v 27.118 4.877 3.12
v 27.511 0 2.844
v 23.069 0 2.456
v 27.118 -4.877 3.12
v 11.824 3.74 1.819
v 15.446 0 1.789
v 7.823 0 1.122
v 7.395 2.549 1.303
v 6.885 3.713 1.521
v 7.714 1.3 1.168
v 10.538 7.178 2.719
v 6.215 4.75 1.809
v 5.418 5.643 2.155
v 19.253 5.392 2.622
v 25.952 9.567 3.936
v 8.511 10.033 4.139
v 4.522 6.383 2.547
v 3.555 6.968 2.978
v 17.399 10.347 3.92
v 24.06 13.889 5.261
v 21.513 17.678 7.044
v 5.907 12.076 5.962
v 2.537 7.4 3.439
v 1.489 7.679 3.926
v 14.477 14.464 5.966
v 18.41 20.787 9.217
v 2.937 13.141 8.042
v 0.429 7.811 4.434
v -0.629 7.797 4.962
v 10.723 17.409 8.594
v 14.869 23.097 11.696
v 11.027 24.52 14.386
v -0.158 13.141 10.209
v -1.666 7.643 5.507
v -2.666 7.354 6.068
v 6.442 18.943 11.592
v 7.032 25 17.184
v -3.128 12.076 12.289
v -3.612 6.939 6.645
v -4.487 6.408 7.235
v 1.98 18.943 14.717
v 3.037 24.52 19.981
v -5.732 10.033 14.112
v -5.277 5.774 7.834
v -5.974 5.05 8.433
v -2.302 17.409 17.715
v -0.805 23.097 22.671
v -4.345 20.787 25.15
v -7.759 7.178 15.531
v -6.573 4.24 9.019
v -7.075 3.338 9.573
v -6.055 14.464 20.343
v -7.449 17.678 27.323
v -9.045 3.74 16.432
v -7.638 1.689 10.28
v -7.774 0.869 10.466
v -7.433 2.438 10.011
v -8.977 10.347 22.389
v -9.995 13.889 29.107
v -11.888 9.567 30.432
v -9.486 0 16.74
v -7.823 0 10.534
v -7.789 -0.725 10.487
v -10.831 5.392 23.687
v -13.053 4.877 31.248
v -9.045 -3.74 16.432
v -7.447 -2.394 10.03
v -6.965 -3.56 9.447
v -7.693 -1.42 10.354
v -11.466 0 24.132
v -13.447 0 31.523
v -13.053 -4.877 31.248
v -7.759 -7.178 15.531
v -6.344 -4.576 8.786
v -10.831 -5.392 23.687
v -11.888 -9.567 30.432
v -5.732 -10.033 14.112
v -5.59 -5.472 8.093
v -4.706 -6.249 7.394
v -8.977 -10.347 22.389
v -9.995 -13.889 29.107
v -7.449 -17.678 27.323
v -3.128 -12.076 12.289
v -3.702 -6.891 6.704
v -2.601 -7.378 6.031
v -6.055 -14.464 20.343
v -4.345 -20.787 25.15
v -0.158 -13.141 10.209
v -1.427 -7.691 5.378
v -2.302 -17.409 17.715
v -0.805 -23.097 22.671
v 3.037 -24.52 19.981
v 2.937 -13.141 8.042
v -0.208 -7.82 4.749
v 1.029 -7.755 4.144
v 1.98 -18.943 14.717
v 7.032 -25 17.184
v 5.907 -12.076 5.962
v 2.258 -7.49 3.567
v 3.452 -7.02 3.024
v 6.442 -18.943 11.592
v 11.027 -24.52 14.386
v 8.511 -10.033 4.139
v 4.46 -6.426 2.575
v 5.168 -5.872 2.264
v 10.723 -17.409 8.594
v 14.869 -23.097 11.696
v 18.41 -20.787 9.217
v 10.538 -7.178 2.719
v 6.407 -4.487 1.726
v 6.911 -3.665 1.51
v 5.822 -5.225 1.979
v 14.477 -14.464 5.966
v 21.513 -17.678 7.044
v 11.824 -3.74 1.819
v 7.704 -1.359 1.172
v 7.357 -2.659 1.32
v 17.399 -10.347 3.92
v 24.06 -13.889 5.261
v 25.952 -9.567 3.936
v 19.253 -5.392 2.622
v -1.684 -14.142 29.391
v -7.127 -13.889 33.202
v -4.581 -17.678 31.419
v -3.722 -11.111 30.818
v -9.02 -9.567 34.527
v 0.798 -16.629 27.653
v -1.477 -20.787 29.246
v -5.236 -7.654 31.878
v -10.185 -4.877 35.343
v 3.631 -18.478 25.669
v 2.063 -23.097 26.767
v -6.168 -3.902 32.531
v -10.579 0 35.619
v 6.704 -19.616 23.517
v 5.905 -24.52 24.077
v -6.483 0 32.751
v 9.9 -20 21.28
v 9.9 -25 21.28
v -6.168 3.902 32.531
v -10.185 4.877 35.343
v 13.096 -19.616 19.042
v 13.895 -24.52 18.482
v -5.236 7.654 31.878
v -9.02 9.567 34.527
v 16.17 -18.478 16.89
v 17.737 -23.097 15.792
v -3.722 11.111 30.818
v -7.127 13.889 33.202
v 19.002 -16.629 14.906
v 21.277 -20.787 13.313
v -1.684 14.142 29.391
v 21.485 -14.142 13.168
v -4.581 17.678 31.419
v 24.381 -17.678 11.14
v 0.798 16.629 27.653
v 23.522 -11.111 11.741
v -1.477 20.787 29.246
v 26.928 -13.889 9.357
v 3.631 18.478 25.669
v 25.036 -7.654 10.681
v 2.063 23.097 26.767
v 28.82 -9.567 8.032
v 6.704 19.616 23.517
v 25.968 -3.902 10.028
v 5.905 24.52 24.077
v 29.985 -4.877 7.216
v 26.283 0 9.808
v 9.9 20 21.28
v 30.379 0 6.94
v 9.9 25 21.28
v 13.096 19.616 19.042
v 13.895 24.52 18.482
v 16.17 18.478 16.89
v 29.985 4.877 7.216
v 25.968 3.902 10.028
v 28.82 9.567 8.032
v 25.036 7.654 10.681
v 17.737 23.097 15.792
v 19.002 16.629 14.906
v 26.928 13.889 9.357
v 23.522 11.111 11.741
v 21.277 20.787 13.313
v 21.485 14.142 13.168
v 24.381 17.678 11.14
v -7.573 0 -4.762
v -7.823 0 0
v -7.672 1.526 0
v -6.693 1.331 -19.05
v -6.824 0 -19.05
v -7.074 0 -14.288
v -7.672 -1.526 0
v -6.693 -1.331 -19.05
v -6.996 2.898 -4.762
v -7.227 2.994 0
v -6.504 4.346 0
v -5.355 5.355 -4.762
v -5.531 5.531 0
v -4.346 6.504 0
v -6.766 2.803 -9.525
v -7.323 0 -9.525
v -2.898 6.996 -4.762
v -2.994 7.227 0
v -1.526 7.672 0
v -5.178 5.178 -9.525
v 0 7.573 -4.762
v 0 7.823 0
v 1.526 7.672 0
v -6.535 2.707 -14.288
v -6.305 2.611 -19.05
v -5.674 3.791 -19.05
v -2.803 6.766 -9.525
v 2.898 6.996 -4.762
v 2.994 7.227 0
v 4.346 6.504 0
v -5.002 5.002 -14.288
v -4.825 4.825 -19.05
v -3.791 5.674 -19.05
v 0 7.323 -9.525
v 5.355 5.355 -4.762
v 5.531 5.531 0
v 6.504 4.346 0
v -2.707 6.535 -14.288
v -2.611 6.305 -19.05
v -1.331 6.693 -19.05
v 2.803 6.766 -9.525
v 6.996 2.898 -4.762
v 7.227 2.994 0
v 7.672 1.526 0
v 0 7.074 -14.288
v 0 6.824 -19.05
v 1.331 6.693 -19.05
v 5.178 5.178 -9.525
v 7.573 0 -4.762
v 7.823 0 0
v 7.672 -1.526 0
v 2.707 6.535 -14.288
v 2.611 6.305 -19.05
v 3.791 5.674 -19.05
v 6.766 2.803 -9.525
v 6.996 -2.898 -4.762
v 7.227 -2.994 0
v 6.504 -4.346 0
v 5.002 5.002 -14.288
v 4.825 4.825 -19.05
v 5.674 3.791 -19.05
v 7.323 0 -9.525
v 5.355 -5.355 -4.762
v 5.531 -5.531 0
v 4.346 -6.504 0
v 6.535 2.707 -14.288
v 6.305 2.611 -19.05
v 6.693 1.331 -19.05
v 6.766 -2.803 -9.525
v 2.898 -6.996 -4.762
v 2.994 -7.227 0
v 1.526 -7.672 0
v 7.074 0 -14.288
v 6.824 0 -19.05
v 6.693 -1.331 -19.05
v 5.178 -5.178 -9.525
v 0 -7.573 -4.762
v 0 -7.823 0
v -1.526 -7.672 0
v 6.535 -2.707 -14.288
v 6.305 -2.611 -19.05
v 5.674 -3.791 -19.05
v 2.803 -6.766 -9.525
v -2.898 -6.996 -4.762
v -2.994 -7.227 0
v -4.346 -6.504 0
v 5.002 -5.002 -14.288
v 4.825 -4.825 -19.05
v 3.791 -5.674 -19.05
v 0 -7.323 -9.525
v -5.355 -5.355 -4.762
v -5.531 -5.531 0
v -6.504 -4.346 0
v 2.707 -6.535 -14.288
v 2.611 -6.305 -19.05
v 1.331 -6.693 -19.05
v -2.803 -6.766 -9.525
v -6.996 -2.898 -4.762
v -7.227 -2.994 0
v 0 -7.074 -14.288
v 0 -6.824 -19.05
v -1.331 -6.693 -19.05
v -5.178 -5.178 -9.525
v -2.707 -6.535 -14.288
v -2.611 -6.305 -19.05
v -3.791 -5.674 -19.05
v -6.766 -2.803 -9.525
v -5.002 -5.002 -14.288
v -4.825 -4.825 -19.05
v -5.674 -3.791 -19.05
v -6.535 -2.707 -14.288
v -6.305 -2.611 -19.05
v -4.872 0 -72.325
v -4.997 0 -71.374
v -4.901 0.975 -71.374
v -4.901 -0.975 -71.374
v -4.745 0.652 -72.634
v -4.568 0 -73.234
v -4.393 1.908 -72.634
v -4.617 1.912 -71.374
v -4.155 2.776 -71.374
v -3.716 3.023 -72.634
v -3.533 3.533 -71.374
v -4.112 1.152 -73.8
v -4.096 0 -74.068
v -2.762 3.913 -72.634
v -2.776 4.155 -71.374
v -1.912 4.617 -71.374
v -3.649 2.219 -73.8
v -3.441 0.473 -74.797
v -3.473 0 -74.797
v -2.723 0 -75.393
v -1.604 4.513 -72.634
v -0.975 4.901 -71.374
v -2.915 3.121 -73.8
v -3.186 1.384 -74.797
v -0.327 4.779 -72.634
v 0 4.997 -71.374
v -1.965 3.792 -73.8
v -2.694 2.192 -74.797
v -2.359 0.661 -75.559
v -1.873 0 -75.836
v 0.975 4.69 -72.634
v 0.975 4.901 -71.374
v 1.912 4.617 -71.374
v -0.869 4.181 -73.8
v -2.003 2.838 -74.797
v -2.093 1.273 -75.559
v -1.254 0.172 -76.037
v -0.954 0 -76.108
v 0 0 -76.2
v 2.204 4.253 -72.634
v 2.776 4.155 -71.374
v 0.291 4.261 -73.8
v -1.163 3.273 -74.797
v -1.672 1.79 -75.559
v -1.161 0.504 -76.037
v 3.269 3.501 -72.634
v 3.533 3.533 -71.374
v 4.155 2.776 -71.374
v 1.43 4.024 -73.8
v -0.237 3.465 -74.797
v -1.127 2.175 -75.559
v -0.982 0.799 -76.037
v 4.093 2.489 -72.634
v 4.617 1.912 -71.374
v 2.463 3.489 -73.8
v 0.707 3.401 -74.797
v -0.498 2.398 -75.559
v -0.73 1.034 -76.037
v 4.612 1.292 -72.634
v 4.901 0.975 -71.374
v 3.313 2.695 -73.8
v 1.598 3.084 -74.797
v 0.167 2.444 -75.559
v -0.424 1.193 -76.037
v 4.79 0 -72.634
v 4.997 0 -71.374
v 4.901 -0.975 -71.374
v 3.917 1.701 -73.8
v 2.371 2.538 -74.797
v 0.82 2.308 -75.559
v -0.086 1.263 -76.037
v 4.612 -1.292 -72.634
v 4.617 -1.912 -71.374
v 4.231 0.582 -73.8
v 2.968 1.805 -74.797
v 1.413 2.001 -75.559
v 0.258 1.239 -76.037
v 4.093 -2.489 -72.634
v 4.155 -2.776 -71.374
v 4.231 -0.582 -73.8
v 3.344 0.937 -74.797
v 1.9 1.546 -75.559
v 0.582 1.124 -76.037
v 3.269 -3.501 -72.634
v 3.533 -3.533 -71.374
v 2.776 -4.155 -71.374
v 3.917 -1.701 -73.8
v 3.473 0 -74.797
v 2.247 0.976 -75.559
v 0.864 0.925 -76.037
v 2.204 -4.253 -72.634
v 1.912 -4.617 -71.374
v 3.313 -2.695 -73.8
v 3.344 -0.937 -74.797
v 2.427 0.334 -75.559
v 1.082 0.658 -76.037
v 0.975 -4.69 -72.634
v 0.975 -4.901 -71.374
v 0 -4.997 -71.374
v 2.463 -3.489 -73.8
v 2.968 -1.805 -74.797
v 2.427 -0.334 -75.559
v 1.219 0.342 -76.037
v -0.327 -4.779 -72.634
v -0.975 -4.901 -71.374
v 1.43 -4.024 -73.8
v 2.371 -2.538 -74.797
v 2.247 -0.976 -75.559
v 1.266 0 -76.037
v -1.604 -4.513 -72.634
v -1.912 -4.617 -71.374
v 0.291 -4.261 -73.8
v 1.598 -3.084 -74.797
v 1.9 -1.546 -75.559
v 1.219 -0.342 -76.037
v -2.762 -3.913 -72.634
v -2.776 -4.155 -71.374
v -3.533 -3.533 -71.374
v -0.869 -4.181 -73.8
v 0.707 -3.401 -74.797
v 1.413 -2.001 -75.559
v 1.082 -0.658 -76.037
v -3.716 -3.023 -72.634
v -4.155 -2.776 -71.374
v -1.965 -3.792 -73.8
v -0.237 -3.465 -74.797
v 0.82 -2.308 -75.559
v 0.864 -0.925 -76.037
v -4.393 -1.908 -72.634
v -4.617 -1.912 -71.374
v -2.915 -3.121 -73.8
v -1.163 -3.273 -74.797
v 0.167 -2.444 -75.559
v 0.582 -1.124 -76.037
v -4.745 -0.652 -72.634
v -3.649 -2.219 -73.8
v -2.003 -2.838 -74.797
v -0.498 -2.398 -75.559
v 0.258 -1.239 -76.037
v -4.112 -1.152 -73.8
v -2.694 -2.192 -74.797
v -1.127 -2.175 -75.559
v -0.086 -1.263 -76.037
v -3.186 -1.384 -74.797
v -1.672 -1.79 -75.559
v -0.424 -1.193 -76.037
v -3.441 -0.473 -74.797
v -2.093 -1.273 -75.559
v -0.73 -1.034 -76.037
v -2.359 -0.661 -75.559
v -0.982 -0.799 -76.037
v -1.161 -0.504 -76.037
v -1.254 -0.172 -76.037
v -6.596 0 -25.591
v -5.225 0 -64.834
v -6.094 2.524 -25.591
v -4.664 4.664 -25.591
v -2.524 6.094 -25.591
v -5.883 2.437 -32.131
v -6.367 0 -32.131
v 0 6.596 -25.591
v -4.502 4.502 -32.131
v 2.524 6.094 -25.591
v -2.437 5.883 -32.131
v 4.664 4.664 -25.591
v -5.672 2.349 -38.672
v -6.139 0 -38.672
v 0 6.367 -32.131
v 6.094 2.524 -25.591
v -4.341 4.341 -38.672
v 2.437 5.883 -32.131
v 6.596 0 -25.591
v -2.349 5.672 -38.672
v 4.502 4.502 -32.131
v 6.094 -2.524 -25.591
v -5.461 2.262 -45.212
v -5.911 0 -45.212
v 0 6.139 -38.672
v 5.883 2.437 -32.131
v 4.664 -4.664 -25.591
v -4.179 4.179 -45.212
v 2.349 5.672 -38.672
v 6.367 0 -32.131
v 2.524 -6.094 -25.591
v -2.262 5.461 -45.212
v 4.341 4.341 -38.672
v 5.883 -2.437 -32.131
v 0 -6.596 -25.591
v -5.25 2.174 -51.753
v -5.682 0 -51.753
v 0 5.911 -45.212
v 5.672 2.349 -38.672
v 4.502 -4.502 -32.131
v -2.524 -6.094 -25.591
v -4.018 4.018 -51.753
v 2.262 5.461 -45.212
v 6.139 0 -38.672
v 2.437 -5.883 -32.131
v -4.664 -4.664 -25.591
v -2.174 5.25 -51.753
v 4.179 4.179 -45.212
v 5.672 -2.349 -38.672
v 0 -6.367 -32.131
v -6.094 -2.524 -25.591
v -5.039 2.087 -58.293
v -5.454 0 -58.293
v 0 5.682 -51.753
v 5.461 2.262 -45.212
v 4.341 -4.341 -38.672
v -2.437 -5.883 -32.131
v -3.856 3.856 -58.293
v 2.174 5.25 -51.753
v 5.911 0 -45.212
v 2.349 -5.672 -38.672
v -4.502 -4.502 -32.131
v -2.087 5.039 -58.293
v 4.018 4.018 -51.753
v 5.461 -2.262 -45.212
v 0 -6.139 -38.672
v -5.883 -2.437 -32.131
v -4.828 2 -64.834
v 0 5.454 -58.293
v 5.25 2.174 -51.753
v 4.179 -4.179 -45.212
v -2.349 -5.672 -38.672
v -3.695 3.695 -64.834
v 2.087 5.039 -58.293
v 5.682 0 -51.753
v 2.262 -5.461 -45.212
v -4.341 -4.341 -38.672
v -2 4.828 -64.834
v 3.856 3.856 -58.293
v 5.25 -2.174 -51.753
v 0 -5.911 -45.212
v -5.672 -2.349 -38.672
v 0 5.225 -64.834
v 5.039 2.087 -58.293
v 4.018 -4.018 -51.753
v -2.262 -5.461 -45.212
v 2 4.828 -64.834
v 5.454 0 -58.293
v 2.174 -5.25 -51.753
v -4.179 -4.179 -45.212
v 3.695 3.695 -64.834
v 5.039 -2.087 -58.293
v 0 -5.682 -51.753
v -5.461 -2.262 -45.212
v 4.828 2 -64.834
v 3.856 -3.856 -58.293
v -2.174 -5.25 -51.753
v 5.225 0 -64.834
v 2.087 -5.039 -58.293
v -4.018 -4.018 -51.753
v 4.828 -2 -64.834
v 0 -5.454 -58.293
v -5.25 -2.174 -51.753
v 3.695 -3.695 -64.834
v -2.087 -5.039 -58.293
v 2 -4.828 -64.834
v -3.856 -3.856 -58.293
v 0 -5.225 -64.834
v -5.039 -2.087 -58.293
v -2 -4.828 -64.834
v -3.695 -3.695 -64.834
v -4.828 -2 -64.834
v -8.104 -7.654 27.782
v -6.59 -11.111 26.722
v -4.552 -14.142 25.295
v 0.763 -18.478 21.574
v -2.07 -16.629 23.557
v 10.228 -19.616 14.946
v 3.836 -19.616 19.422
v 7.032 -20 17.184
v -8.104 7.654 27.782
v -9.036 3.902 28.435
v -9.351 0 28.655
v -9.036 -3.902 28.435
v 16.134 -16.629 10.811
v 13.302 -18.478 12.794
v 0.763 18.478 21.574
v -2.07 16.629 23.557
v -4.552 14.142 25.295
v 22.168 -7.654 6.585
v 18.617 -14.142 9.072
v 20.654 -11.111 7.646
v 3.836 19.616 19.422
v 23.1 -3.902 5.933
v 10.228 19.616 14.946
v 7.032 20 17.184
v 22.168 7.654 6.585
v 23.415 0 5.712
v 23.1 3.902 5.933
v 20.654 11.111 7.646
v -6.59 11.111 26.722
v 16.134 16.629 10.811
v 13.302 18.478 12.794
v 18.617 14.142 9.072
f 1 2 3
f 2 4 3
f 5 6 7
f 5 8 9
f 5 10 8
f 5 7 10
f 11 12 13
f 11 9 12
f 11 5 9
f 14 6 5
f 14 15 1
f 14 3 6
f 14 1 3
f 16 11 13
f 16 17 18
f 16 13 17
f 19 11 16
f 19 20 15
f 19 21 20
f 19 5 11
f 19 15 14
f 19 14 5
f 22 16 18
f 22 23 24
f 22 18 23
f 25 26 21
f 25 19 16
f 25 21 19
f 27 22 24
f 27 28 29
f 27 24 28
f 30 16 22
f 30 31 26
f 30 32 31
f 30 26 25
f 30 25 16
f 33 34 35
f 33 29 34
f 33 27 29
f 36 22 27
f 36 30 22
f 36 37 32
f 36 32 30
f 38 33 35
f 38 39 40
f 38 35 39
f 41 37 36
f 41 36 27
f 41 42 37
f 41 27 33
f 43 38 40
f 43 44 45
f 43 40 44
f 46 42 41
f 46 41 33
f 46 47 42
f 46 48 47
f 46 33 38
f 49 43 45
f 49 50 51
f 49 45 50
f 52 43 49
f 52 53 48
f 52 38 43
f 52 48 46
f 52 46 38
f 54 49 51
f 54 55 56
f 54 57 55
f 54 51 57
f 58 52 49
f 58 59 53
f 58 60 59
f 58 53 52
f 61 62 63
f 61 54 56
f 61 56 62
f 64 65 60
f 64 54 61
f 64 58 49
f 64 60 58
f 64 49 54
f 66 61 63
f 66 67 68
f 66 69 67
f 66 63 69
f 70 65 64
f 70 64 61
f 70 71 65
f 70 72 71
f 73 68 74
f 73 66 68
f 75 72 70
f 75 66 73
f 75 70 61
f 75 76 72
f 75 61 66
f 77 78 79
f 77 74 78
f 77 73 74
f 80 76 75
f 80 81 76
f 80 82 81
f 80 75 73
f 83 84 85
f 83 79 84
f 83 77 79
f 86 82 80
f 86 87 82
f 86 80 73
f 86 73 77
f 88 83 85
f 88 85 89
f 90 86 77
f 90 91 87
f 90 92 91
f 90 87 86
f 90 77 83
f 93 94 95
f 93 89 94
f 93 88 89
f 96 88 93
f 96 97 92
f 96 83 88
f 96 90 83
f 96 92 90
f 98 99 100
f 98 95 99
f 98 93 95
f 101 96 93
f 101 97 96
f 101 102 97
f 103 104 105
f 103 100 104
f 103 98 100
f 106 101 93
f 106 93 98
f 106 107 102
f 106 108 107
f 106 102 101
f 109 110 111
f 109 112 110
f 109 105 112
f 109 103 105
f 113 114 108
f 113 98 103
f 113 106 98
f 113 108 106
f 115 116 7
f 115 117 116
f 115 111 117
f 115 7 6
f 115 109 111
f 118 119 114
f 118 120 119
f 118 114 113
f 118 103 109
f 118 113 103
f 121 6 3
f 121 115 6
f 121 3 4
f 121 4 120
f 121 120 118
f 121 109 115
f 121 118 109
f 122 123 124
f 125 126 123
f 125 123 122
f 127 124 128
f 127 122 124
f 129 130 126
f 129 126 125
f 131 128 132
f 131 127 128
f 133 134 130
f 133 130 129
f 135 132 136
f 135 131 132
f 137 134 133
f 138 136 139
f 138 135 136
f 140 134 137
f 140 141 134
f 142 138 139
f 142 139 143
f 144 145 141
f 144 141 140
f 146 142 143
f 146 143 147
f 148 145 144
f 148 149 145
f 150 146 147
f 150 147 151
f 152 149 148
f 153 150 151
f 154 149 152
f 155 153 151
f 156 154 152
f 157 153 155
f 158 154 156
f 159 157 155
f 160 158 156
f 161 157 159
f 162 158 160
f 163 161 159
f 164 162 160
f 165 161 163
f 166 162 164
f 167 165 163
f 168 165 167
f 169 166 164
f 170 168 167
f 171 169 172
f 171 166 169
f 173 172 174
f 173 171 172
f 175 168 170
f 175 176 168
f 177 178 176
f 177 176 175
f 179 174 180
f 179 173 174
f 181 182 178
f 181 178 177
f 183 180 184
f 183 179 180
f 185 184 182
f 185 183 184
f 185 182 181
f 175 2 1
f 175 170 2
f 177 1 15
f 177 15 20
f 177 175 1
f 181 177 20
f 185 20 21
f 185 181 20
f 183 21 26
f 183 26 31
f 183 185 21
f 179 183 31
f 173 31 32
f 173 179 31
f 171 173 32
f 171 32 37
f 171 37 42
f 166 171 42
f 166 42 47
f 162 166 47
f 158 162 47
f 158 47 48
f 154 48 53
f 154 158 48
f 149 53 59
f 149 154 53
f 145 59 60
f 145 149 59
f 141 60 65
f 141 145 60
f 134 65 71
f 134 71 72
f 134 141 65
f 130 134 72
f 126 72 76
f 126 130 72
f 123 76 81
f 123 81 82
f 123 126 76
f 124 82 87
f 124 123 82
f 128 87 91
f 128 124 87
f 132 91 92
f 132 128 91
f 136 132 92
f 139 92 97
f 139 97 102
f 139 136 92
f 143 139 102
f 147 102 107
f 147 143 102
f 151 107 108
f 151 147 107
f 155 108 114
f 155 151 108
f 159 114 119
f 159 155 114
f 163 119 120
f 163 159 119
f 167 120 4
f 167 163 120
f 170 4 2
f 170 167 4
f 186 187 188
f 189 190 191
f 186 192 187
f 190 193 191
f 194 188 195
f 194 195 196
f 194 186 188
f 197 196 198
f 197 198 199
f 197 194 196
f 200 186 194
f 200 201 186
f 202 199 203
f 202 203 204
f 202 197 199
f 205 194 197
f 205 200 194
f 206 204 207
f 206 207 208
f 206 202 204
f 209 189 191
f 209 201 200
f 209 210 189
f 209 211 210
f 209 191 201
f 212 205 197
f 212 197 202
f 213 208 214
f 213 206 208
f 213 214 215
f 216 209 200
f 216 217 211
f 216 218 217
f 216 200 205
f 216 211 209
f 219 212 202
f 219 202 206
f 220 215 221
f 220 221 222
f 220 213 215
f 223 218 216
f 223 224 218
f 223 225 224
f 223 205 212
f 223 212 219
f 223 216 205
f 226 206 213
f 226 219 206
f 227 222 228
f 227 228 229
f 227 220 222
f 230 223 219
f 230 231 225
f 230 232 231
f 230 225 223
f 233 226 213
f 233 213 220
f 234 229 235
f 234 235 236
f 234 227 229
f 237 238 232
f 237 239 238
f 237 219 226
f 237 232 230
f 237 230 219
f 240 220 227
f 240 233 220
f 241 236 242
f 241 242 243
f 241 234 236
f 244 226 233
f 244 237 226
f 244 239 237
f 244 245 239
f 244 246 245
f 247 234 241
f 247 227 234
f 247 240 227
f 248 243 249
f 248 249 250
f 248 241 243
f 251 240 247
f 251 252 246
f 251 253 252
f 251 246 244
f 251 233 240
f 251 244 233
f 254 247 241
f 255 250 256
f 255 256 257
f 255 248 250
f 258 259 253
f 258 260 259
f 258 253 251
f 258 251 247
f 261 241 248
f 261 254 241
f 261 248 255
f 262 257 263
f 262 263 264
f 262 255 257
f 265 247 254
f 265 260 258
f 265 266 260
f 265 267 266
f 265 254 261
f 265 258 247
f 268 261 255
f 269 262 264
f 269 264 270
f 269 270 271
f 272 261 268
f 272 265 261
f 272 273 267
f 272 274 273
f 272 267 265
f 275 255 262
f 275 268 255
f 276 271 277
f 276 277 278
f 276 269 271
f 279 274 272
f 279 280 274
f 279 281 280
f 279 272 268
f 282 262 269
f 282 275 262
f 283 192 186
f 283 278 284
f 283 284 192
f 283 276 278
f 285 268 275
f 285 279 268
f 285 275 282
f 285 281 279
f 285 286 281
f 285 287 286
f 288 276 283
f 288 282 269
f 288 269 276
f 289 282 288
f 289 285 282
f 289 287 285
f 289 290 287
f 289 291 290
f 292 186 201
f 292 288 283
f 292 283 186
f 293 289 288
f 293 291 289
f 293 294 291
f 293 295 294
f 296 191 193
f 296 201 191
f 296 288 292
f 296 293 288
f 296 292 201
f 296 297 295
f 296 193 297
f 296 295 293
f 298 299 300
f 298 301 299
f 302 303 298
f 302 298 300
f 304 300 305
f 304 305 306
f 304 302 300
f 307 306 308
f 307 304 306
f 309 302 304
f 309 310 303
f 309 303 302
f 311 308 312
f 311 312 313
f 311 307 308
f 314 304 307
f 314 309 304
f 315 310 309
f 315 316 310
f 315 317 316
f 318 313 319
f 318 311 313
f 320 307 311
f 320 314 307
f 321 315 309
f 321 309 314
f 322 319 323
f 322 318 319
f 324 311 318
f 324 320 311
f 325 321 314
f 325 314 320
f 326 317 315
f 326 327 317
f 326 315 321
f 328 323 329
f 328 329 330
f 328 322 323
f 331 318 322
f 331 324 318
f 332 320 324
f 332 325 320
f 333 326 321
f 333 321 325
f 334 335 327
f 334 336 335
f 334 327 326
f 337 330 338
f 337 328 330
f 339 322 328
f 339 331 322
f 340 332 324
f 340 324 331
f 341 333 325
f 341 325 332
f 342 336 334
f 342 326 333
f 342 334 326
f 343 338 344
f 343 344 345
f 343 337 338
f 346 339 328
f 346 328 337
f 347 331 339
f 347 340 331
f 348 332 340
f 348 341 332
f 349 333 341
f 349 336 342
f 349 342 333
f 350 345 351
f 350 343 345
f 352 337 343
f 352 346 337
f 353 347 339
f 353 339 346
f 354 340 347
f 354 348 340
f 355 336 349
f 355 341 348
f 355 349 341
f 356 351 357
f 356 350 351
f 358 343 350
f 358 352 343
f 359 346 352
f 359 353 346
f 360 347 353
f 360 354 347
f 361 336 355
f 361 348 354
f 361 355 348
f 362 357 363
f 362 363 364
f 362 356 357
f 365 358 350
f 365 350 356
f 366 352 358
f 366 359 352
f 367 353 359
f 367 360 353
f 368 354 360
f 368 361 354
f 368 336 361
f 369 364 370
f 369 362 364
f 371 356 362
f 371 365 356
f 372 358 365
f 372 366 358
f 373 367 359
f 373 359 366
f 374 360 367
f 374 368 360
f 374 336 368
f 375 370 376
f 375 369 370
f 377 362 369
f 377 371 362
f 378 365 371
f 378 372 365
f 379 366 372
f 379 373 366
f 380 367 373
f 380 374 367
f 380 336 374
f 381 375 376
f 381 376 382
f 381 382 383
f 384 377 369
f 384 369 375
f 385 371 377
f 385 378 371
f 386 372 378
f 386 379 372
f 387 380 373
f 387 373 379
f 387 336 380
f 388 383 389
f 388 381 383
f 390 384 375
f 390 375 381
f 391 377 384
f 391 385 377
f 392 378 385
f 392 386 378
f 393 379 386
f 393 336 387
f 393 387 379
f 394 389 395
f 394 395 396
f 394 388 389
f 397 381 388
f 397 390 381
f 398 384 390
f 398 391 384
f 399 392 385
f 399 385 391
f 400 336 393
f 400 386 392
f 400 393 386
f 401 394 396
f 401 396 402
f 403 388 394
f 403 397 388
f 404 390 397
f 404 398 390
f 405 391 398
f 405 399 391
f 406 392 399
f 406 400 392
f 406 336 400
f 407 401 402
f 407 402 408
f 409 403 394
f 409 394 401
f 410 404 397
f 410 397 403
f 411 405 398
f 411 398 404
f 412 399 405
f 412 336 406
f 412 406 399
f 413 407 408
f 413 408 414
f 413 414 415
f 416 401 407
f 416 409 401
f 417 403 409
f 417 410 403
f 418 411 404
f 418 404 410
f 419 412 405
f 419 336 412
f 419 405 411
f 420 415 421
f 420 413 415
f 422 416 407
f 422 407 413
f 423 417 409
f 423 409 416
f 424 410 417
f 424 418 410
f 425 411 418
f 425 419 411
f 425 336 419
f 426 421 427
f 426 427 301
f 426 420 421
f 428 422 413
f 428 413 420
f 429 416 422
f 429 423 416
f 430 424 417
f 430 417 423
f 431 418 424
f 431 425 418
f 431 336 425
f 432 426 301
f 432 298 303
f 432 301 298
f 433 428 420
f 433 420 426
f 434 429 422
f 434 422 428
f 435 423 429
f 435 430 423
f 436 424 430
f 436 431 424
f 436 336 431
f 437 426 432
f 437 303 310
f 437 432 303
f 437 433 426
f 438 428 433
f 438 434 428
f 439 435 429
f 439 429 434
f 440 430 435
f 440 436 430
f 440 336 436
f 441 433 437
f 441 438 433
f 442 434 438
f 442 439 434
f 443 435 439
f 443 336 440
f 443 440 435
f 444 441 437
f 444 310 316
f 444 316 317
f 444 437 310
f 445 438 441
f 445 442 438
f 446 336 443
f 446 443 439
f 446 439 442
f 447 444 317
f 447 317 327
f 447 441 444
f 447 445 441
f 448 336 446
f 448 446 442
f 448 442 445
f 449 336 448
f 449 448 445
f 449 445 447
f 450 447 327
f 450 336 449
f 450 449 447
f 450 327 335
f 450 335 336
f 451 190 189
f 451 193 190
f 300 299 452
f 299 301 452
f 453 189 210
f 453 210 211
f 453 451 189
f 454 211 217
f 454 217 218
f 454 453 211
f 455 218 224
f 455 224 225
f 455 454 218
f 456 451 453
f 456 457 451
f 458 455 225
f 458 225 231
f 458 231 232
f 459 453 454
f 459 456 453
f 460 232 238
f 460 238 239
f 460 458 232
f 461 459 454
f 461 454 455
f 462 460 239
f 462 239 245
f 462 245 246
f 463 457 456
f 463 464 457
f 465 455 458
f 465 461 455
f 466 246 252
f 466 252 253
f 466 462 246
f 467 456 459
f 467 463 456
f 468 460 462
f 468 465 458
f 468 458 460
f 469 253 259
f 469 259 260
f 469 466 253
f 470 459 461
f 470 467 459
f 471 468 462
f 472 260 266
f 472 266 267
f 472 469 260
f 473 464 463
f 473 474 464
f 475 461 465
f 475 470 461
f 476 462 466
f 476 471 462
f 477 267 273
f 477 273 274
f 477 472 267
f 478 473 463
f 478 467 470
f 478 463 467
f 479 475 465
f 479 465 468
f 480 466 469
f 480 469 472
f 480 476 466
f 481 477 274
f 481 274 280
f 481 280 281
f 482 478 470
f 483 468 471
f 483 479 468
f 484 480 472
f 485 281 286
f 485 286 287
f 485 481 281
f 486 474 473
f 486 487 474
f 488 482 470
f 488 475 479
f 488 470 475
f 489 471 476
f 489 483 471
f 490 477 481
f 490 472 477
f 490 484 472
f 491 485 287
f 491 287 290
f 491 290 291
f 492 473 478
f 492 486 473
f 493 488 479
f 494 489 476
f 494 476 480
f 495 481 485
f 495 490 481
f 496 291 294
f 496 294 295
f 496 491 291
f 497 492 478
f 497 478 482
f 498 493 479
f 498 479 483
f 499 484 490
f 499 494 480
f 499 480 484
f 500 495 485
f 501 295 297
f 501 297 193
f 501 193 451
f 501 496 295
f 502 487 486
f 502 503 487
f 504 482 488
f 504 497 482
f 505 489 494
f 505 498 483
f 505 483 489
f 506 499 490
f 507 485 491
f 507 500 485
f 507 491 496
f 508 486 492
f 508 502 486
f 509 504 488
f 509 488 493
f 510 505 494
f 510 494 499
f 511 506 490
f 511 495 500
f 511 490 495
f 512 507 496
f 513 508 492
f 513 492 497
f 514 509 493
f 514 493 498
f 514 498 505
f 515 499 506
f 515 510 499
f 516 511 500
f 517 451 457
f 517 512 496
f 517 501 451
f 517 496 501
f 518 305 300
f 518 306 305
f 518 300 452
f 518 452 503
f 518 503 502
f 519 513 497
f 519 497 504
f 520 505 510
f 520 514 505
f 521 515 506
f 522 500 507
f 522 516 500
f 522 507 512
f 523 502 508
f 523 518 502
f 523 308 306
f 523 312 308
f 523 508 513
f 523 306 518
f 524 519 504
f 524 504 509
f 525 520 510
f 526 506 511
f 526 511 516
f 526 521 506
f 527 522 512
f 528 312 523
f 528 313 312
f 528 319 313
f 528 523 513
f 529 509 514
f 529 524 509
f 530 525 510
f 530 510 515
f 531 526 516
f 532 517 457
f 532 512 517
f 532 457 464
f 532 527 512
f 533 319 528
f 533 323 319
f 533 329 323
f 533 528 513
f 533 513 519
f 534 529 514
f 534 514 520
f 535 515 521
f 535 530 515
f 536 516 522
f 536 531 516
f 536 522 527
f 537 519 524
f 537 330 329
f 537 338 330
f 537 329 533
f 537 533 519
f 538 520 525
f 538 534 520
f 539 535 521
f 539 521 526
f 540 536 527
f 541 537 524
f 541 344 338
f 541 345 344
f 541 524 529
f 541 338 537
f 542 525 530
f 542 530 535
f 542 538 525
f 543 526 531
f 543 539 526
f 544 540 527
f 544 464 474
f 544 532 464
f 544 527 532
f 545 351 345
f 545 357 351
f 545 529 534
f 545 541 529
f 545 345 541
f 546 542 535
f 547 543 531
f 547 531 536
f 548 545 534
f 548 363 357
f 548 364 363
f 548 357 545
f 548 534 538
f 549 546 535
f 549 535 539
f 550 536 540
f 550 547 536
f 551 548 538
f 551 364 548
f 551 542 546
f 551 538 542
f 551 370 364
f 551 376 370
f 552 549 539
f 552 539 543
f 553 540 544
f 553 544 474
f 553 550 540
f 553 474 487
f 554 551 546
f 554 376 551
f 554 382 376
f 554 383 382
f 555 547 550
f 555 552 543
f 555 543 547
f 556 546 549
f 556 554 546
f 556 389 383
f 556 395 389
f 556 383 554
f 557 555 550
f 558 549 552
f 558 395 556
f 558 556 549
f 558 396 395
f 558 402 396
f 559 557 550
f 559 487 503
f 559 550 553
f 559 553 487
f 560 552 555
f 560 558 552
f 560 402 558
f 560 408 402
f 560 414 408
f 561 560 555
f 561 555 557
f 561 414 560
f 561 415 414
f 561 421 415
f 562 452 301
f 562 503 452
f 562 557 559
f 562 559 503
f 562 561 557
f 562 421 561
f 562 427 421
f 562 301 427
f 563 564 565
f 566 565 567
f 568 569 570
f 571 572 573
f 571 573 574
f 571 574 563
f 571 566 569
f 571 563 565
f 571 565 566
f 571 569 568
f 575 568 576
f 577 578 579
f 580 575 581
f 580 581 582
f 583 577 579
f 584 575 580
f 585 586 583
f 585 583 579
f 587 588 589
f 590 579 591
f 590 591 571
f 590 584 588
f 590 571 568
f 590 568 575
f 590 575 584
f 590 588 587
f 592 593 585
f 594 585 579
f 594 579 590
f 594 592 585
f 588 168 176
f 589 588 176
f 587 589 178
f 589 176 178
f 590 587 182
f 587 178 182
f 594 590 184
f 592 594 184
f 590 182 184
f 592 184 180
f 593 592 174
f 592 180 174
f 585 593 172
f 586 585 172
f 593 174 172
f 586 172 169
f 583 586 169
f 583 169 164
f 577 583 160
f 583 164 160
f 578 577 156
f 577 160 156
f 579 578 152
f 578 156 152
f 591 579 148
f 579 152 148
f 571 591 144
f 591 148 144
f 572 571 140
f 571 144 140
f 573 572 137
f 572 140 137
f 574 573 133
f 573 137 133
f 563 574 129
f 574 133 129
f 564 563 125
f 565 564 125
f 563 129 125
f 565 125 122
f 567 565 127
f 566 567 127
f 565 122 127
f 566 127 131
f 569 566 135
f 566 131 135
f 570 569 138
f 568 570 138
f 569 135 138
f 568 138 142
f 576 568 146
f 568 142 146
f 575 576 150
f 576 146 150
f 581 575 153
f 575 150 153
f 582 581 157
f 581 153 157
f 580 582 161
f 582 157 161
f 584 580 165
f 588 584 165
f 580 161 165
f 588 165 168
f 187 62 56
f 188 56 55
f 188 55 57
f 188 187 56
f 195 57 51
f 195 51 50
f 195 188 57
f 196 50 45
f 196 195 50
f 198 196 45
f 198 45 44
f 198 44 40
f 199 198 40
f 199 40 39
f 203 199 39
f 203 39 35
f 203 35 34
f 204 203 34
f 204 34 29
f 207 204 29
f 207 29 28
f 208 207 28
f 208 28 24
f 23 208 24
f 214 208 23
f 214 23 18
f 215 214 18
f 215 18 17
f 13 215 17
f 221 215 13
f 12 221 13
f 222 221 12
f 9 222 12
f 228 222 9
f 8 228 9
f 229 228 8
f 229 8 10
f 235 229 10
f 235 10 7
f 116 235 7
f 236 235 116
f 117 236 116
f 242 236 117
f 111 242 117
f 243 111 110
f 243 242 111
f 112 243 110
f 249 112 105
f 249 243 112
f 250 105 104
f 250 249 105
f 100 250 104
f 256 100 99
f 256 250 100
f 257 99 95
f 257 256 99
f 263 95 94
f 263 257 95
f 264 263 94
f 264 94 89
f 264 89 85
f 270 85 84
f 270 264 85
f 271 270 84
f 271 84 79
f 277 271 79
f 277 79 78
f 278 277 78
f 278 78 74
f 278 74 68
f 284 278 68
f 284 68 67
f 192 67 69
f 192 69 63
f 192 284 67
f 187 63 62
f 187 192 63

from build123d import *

# Parameters (mm, degrees)
F5_R     = 20
F6_DEPTH = 5


with BuildPart() as f1:
    # F0 (on Front) → F1 (revolve)
    with BuildSketch(Plane.XZ):
        with BuildLine():
            Line((-6.8241658505, -19.05), (-4.9969541351, -71.3744974835))
            ThreePointArc((-4.9969541351, -71.3744974835), (-3.4732918523, -74.7966990017), (0, -76.2))
            Line((0, -76.2), (0, 0))
            Line((0, 0), (0, 20))
            Line((0, 20), (-7.8225340458, 20))
            Line((-7.8225340458, 20), (-7.8225340458, 0))
            Line((-7.8225340458, 0), (-6.8241658505, -19.05))
        make_face()
    revolve(axis=Axis((0, 0, 4.3368881511), (0, 0, -1)))

    # F3 (on Front) → F4 (revolve)
    with BuildSketch(Plane.XZ):
        Polygon((9.9000765866, 21.2795146775), (-5, 0), (27.5109955121, 2.8443435472), (30.3788776938, 6.9401037687), align=None)
    revolve(axis=Axis((2.4500382933, 0, 10.6397573387), (0.5735764364, 0, 0.8191520443)))

    # F5 (on face) → F6 (cut)
    with BuildSketch(Plane(origin=(13.2551269449, 0, 18.9302831255), x_dir=(0.8191520443, 0, -0.5735764364), z_dir=(0.5735764364, 0, 0.8191520443))):
        with Locations((-4.0957602214, 0)):
            Circle(F5_R)
    extrude(amount=-F6_DEPTH, mode=Mode.SUBTRACT)


solid = f1.part
